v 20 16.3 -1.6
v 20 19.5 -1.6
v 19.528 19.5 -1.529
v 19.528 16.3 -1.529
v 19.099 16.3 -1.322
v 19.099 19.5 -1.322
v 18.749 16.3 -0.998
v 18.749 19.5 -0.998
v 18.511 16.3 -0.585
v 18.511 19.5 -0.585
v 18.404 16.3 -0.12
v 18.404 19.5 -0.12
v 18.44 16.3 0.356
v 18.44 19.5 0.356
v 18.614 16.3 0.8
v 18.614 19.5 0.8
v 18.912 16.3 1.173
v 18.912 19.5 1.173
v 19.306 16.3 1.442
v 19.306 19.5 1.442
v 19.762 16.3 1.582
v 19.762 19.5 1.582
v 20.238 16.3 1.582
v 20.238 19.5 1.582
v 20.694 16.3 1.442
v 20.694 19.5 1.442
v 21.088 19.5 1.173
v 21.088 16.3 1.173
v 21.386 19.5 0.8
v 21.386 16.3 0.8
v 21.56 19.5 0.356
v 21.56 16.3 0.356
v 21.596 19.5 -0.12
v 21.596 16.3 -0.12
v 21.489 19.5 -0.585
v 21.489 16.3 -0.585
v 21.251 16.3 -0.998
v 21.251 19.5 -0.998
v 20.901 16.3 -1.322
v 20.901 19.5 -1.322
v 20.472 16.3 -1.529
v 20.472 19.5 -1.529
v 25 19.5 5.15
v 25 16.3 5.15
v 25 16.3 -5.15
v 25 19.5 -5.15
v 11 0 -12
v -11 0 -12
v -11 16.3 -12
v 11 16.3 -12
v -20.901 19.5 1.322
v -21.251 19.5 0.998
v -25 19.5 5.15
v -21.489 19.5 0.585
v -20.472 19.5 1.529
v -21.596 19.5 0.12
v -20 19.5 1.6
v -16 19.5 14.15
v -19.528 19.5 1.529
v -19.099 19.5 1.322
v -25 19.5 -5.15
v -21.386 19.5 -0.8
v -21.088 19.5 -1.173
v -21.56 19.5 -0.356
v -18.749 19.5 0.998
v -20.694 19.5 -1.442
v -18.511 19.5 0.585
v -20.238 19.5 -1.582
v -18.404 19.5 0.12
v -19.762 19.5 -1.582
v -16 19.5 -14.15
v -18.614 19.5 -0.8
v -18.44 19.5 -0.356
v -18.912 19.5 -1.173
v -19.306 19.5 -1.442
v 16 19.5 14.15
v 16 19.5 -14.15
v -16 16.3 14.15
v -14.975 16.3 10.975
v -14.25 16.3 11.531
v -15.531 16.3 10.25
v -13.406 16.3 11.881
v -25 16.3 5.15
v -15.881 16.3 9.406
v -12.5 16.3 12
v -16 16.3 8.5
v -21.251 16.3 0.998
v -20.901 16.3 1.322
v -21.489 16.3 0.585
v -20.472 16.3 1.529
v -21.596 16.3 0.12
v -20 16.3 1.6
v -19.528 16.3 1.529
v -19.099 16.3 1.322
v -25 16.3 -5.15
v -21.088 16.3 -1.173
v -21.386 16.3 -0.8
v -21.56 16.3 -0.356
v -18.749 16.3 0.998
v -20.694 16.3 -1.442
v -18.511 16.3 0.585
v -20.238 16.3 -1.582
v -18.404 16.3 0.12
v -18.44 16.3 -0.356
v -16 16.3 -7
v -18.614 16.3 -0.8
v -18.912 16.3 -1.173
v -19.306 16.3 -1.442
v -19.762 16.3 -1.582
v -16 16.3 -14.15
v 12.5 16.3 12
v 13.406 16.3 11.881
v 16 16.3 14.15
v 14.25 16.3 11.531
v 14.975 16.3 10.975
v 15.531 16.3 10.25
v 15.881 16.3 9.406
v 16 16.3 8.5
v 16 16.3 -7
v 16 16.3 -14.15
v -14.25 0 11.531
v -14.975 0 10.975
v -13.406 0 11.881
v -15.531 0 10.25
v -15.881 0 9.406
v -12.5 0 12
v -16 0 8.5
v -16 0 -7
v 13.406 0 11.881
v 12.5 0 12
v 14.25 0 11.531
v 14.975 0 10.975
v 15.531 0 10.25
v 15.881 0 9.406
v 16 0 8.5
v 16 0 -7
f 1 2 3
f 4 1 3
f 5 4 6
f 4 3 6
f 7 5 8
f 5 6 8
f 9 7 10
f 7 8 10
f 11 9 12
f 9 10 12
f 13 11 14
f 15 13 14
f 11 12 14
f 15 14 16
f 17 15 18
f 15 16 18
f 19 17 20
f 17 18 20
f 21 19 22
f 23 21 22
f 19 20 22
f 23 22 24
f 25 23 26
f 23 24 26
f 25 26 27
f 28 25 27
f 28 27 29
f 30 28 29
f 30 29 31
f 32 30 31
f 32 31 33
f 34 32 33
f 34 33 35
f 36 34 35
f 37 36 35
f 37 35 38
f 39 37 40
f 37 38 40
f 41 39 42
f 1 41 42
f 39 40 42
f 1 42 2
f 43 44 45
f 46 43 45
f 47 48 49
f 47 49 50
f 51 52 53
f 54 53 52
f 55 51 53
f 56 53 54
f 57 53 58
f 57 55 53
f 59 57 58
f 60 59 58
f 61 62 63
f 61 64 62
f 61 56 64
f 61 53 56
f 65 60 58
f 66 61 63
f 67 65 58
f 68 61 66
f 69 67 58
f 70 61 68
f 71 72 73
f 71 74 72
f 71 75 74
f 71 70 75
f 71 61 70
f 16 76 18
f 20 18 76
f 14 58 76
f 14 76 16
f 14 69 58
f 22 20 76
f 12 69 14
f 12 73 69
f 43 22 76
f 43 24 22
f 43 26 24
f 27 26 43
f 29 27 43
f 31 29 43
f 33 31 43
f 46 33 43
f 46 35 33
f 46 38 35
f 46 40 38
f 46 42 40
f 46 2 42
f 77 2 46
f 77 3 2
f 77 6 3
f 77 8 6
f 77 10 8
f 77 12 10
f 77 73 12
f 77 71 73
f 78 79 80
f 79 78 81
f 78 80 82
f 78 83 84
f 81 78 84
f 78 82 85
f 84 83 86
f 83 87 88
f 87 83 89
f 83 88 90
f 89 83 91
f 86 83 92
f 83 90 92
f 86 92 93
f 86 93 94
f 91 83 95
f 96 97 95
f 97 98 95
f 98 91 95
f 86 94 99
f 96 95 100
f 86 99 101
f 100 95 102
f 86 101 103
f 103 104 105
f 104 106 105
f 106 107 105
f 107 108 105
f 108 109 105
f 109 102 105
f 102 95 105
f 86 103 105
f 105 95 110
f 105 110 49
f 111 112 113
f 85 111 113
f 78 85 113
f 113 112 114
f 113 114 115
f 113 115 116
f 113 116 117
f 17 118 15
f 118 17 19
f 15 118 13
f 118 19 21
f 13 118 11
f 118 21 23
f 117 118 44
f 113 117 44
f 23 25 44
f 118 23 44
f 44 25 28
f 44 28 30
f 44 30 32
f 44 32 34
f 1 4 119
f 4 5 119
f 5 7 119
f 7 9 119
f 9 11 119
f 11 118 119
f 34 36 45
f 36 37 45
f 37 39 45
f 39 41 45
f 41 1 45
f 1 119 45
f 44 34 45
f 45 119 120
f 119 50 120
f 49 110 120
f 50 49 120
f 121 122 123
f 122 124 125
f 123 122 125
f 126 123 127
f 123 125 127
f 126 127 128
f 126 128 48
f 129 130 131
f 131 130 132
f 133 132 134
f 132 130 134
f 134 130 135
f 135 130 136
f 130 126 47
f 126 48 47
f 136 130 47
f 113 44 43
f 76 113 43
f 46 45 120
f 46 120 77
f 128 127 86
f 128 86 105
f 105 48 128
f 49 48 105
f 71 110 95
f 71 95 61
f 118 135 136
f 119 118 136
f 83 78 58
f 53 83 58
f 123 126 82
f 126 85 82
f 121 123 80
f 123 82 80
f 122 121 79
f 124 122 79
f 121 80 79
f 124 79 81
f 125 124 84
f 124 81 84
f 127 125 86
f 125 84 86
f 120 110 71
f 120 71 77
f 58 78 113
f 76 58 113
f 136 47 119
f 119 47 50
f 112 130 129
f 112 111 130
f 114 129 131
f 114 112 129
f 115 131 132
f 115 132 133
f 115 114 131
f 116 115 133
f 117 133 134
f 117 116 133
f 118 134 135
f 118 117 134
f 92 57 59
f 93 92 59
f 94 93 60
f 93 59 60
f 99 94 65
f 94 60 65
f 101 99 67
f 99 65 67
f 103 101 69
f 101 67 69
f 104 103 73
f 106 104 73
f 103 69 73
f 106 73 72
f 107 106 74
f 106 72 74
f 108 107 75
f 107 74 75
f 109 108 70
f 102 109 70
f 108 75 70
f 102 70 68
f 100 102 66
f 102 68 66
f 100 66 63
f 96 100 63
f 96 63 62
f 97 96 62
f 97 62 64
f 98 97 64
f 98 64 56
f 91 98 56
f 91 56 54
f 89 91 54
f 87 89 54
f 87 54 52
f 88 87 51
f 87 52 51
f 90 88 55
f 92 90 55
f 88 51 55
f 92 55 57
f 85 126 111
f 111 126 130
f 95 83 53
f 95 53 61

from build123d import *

# Parameters (mm, degrees)
SKETCH1_W           = 32
SKETCH1_H           = 24
BOSS_EXTRUDE1_DEPTH = 16.3
SKETCH2_W           = 50
SKETCH2_H           = 28.3
BOSS_EXTRUDE2_DEPTH = 3.2
FILLET1_R           = 3.5
CHAMFER1_SIZE       = 5
CHAMFER2_SIZE       = 9
SKETCH3_R           = 1.6
CUT_EXTRUDE1_DEPTH  = 3.2


with BuildPart() as part:
    # Sketch1 → Boss-Extrude1 (new body)
    with BuildSketch(Plane(origin=(0, 0, 0), x_dir=(1, 0, 0), z_dir=(0, 1, 0))):
        Rectangle(SKETCH1_W, SKETCH1_H)
    extrude(amount=BOSS_EXTRUDE1_DEPTH)

    # Sketch2 → Boss-Extrude2 (add)
    with BuildSketch(Plane(origin=(0, 16.3, 0), x_dir=(1, 0, 0), z_dir=(0, 1, 0))):
        Rectangle(SKETCH2_W, SKETCH2_H)
    extrude(amount=BOSS_EXTRUDE2_DEPTH)

    # Fillet1
    fillet1_edges = [part.edges().sort_by_distance(p)[0] for p in [
        (16, 8.15, 12),
        (-16, 8.15, 12),
    ]]
    fillet(fillet1_edges, radius=FILLET1_R)

    # Chamfer1
    chamfer1_edges = [part.edges().sort_by_distance(p)[0] for p in [
        (-16, 8.15, -12),
        (16, 8.15, -12),
    ]]
    chamfer(chamfer1_edges, length=CHAMFER1_SIZE)

    # Chamfer2
    chamfer2_edges = [part.edges().sort_by_distance(p)[0] for p in [
        (25, 17.9, 14.15),
        (25, 17.9, -14.15),
        (-25, 17.9, -14.15),
        (-25, 17.9, 14.15),
    ]]
    chamfer(chamfer2_edges, length=CHAMFER2_SIZE)

    # Sketch3 → Cut-Extrude1 (cut)
    with BuildSketch(Plane(origin=(0, 19.5, 0), x_dir=(1, 0, 0), z_dir=(0, 1, 0))):
        with Locations(Location((-20, 0, 0), (0, 0, 270))):
            Circle(SKETCH3_R)
        with Locations(Location((20, 0, 0), (0, 0, 90))):
            Circle(SKETCH3_R)
    extrude(amount=-CUT_EXTRUDE1_DEPTH, mode=Mode.SUBTRACT)


solid = part.part
